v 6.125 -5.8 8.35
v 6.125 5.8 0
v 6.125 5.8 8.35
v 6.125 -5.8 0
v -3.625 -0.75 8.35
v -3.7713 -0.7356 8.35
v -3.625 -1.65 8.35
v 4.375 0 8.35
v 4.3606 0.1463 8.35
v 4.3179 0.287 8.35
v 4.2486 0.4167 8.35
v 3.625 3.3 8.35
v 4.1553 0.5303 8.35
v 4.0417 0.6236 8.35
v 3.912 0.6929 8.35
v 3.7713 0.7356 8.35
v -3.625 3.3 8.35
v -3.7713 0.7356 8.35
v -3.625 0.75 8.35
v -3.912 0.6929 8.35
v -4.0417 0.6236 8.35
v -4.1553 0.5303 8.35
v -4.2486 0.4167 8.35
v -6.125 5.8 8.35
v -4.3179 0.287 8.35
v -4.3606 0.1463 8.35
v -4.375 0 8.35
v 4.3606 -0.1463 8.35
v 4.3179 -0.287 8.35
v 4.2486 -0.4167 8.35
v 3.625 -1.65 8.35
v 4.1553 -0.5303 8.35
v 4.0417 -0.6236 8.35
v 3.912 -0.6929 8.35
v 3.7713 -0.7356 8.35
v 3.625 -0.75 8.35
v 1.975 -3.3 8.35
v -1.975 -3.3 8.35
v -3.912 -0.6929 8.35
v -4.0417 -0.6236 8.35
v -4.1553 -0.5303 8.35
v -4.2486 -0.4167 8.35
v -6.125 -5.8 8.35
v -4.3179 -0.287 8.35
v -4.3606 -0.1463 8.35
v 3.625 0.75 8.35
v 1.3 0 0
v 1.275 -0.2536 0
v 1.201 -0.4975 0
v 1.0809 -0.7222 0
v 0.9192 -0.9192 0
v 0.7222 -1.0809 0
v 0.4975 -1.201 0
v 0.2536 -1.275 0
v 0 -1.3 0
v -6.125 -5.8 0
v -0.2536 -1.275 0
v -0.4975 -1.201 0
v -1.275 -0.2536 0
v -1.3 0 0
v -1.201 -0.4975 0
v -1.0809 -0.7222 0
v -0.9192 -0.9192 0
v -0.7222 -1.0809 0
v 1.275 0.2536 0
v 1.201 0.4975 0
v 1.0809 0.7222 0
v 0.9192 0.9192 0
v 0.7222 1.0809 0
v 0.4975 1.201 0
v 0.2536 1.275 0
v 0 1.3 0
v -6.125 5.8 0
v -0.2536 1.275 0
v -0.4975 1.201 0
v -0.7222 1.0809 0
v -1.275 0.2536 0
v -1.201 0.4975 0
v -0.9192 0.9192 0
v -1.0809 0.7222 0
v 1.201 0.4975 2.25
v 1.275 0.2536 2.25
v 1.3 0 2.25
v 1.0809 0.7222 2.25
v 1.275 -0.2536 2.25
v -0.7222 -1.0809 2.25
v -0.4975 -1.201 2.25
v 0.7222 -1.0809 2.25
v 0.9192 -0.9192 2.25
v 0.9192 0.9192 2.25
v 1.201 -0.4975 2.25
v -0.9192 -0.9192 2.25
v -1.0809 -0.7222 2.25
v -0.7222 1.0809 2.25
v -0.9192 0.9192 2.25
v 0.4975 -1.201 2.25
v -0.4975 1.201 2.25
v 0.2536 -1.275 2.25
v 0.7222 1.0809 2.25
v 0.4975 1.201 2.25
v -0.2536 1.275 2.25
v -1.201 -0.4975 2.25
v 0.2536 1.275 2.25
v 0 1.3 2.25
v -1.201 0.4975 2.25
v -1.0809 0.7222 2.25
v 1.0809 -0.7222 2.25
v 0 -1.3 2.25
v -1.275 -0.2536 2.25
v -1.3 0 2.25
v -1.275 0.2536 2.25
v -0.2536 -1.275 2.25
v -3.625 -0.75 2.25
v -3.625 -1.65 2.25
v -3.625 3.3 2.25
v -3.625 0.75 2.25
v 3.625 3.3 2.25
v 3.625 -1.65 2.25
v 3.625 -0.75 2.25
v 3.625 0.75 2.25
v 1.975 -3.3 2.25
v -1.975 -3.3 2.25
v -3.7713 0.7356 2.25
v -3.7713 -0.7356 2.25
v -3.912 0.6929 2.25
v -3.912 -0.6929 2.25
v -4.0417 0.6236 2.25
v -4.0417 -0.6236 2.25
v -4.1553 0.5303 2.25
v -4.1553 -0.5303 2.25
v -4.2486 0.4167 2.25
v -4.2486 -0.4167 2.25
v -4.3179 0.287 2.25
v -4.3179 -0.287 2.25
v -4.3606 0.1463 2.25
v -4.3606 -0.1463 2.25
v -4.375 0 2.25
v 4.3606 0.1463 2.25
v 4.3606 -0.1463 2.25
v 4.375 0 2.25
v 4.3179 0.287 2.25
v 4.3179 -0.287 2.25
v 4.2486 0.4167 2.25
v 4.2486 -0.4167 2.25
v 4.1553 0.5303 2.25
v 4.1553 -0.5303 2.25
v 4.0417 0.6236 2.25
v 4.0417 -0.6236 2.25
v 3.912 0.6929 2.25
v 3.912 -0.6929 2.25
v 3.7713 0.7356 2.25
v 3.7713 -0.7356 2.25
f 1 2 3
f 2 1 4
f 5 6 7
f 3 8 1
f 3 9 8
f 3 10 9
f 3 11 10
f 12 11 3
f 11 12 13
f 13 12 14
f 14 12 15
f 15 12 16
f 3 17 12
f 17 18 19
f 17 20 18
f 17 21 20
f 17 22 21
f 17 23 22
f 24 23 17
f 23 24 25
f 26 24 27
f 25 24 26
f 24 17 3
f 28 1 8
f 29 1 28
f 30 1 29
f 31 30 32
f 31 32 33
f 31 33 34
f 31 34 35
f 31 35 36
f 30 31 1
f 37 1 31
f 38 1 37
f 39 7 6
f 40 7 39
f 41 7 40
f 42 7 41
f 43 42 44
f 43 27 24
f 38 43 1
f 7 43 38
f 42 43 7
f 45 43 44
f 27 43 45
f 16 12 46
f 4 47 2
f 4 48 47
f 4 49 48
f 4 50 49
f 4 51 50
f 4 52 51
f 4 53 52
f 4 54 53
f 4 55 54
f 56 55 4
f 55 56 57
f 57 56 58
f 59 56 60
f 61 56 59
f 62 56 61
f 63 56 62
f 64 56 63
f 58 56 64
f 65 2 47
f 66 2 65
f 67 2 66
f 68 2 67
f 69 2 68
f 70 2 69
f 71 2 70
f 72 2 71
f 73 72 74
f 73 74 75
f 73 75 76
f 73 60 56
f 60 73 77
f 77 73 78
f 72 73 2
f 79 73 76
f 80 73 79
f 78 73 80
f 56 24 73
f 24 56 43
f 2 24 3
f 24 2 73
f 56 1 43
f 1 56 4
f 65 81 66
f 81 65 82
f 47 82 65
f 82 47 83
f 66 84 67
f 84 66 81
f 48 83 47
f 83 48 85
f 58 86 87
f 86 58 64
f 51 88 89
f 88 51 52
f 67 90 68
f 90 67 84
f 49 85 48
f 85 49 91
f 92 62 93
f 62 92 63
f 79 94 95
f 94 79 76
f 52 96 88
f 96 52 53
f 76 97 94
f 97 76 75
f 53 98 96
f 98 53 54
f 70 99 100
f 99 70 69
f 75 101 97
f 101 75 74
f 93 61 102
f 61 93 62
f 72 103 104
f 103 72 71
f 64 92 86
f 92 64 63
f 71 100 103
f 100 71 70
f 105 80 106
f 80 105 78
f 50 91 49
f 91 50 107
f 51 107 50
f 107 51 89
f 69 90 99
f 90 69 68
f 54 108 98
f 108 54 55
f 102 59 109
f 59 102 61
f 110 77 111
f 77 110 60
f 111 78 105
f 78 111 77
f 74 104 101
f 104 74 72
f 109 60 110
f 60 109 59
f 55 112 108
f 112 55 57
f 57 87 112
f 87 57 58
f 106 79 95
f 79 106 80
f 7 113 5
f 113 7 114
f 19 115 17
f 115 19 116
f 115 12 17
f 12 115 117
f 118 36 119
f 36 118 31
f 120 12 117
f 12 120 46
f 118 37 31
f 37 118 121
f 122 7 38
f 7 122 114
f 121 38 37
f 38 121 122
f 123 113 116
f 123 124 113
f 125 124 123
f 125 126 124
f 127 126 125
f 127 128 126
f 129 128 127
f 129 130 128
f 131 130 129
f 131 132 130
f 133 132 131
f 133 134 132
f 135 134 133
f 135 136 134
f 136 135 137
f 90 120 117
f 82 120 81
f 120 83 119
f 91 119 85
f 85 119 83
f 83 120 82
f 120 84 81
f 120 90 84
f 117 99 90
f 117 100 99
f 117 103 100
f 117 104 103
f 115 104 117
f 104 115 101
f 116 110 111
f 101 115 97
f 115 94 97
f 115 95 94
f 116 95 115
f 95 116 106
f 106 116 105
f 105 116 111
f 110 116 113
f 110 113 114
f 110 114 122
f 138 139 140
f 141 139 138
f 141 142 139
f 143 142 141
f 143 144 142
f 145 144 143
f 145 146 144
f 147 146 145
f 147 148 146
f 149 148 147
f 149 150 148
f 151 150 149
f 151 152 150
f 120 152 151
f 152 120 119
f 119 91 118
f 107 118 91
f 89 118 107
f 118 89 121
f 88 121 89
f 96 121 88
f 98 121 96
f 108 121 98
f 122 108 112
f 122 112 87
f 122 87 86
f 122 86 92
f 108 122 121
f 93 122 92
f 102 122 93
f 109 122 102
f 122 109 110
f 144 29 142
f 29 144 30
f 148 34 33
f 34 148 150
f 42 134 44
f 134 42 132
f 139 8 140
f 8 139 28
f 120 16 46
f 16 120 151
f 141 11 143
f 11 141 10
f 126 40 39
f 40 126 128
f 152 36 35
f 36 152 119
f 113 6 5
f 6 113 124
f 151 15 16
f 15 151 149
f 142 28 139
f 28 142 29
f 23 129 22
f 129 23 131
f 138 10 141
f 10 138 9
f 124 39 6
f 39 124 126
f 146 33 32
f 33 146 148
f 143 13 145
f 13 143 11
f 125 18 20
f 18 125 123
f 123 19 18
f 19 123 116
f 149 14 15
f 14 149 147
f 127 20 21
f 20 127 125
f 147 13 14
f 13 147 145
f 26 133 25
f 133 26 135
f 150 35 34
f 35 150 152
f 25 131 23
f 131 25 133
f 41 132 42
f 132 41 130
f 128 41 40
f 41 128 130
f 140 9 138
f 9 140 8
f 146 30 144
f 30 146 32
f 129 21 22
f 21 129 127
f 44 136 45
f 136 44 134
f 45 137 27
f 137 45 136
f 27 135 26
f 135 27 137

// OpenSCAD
// Toslink connector.
//
fiber_height=2.25;
fiber_diameter=2.5 + 0.1;

connector_height=6.0 + 0.1;
connector_width=6.5 + 0.1;
connector_length=7.25;

connector_edge=connector_width/4;

case_diameter = 10.5;
RastNaseRadius = 1.5;

wt = 2.5;

difference(){
    translate([-(connector_length+2*wt)/2, -(connector_width+2*wt)/2, 0])
        cube (size=[connector_length+2*wt, connector_width+2*wt, fiber_height+connector_height]);

    // Bohrung fiber
	cylinder(d=fiber_diameter,h=2*(fiber_height+connector_height),$fn=32);

    // Connector
    translate([0, 0, fiber_height])
        linear_extrude(height = connector_height, center = false, convexity = 10, twist = 0)
            polygon(points = [
                [ connector_length/2                , -connector_width/2+connector_edge],
                [ connector_length/2-connector_edge , -connector_width/2               ],
                [-connector_length/2+connector_edge , -connector_width/2               ],
                [-connector_length/2                , -connector_width/2+connector_edge],
                [-connector_length/2                ,  connector_width/2               ],
                [ connector_length/2                ,  connector_width/2               ]
            ]);

    // Rast-Nase
    translate([-connector_length/2,0,fiber_height])
    hull() {
        translate([connector_length,0,0]) cylinder(d=RastNaseRadius, h=connector_height, $fn=32);
        cylinder(d=RastNaseRadius, h=connector_height, $fn=32);
    }
}


//translate ([0,0, -10]) import("C:/Users/A410882/Downloads/Toslink_connector_/files/Toslink_connector.stl");
